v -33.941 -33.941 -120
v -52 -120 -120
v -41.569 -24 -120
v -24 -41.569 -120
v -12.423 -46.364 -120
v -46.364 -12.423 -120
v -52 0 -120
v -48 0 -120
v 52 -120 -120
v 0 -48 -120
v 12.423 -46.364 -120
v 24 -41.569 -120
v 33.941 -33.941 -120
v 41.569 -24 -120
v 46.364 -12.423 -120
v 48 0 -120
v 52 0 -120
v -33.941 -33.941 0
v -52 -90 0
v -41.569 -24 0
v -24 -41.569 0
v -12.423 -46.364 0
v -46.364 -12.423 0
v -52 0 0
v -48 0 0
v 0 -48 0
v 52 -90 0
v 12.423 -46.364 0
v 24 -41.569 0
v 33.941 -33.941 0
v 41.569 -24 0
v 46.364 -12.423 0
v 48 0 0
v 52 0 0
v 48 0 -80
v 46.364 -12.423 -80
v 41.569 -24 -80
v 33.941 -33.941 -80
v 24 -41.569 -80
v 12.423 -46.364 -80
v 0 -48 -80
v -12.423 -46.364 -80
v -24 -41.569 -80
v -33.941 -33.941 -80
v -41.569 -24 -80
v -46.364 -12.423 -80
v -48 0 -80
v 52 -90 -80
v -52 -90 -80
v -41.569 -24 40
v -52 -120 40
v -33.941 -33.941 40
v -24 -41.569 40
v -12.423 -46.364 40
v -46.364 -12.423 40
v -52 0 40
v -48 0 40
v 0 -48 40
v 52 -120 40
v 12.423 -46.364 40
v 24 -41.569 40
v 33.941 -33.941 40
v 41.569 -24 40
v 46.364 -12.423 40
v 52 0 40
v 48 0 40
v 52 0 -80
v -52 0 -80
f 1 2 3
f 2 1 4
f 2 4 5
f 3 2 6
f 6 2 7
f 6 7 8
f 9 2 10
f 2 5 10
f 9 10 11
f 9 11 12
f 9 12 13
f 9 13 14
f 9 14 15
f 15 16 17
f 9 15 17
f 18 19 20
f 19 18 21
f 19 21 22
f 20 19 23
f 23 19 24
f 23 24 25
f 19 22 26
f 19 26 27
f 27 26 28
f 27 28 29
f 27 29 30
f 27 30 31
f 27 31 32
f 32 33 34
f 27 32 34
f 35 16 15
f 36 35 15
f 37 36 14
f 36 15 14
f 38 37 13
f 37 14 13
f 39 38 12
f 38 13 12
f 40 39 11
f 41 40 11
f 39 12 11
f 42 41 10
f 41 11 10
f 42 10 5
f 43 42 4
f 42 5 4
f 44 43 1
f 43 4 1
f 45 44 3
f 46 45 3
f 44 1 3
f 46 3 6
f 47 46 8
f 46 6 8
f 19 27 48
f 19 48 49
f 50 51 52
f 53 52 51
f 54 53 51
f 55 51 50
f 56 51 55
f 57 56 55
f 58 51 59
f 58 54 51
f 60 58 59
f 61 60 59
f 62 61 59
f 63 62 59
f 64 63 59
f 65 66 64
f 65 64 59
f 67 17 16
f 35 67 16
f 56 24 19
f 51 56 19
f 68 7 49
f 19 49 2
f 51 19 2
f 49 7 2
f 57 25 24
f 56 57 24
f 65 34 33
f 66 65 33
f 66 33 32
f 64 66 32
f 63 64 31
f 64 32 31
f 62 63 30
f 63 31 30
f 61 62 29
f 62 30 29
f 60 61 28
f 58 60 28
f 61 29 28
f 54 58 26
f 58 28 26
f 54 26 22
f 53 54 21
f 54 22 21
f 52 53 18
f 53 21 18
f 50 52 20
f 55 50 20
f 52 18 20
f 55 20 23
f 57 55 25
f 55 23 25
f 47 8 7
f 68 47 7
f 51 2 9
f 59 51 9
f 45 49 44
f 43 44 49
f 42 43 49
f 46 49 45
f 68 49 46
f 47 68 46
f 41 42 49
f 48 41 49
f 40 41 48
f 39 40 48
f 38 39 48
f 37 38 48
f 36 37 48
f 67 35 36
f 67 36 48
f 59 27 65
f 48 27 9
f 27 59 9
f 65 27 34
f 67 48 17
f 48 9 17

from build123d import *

# Parameters (mm, degrees)
BOSS_EXTRUDE1_DEPTH = 40
SKETCH2_W           = 104
SKETCH2_H           = 30
BOSS_EXTRUDE2_DEPTH = 80
BOSS_EXTRUDE3_START = -120
BOSS_EXTRUDE3_DEPTH = 40


with BuildPart() as part:
    # Sketch1 → Boss-Extrude1 (new body)
    with BuildSketch(Plane.XY):
        with BuildLine():
            Line((-52, 0), (-52, -120))
            Line((-52, -120), (52, -120))
            Line((52, -120), (52, 0))
            Line((52, 0), (48, 0))
            ThreePointArc((48, 0), (0, -48), (-48, 0))
            Line((-48, 0), (-52, 0))
        make_face()
    extrude(amount=BOSS_EXTRUDE1_DEPTH)

    # Sketch2 → Boss-Extrude2 (add)
    with BuildSketch(Plane(origin=(0, 0, 0), x_dir=(-1, 0, 0), z_dir=(0, 0, -1))):
        with Locations((0, -105)):
            Rectangle(SKETCH2_W, SKETCH2_H)
    extrude(amount=BOSS_EXTRUDE2_DEPTH)

    # Sketch1<2> → Boss-Extrude3 (add)
    with BuildSketch(Plane.XY.offset(BOSS_EXTRUDE3_START)):
        with BuildLine():
            Line((-52, 0), (-52, -120))
            Line((-52, -120), (52, -120))
            Line((52, -120), (52, 0))
            Line((52, 0), (48, 0))
            ThreePointArc((48, 0), (0, -48), (-48, 0))
            Line((-48, 0), (-52, 0))
        make_face()
    extrude(amount=BOSS_EXTRUDE3_DEPTH)


solid = part.part
